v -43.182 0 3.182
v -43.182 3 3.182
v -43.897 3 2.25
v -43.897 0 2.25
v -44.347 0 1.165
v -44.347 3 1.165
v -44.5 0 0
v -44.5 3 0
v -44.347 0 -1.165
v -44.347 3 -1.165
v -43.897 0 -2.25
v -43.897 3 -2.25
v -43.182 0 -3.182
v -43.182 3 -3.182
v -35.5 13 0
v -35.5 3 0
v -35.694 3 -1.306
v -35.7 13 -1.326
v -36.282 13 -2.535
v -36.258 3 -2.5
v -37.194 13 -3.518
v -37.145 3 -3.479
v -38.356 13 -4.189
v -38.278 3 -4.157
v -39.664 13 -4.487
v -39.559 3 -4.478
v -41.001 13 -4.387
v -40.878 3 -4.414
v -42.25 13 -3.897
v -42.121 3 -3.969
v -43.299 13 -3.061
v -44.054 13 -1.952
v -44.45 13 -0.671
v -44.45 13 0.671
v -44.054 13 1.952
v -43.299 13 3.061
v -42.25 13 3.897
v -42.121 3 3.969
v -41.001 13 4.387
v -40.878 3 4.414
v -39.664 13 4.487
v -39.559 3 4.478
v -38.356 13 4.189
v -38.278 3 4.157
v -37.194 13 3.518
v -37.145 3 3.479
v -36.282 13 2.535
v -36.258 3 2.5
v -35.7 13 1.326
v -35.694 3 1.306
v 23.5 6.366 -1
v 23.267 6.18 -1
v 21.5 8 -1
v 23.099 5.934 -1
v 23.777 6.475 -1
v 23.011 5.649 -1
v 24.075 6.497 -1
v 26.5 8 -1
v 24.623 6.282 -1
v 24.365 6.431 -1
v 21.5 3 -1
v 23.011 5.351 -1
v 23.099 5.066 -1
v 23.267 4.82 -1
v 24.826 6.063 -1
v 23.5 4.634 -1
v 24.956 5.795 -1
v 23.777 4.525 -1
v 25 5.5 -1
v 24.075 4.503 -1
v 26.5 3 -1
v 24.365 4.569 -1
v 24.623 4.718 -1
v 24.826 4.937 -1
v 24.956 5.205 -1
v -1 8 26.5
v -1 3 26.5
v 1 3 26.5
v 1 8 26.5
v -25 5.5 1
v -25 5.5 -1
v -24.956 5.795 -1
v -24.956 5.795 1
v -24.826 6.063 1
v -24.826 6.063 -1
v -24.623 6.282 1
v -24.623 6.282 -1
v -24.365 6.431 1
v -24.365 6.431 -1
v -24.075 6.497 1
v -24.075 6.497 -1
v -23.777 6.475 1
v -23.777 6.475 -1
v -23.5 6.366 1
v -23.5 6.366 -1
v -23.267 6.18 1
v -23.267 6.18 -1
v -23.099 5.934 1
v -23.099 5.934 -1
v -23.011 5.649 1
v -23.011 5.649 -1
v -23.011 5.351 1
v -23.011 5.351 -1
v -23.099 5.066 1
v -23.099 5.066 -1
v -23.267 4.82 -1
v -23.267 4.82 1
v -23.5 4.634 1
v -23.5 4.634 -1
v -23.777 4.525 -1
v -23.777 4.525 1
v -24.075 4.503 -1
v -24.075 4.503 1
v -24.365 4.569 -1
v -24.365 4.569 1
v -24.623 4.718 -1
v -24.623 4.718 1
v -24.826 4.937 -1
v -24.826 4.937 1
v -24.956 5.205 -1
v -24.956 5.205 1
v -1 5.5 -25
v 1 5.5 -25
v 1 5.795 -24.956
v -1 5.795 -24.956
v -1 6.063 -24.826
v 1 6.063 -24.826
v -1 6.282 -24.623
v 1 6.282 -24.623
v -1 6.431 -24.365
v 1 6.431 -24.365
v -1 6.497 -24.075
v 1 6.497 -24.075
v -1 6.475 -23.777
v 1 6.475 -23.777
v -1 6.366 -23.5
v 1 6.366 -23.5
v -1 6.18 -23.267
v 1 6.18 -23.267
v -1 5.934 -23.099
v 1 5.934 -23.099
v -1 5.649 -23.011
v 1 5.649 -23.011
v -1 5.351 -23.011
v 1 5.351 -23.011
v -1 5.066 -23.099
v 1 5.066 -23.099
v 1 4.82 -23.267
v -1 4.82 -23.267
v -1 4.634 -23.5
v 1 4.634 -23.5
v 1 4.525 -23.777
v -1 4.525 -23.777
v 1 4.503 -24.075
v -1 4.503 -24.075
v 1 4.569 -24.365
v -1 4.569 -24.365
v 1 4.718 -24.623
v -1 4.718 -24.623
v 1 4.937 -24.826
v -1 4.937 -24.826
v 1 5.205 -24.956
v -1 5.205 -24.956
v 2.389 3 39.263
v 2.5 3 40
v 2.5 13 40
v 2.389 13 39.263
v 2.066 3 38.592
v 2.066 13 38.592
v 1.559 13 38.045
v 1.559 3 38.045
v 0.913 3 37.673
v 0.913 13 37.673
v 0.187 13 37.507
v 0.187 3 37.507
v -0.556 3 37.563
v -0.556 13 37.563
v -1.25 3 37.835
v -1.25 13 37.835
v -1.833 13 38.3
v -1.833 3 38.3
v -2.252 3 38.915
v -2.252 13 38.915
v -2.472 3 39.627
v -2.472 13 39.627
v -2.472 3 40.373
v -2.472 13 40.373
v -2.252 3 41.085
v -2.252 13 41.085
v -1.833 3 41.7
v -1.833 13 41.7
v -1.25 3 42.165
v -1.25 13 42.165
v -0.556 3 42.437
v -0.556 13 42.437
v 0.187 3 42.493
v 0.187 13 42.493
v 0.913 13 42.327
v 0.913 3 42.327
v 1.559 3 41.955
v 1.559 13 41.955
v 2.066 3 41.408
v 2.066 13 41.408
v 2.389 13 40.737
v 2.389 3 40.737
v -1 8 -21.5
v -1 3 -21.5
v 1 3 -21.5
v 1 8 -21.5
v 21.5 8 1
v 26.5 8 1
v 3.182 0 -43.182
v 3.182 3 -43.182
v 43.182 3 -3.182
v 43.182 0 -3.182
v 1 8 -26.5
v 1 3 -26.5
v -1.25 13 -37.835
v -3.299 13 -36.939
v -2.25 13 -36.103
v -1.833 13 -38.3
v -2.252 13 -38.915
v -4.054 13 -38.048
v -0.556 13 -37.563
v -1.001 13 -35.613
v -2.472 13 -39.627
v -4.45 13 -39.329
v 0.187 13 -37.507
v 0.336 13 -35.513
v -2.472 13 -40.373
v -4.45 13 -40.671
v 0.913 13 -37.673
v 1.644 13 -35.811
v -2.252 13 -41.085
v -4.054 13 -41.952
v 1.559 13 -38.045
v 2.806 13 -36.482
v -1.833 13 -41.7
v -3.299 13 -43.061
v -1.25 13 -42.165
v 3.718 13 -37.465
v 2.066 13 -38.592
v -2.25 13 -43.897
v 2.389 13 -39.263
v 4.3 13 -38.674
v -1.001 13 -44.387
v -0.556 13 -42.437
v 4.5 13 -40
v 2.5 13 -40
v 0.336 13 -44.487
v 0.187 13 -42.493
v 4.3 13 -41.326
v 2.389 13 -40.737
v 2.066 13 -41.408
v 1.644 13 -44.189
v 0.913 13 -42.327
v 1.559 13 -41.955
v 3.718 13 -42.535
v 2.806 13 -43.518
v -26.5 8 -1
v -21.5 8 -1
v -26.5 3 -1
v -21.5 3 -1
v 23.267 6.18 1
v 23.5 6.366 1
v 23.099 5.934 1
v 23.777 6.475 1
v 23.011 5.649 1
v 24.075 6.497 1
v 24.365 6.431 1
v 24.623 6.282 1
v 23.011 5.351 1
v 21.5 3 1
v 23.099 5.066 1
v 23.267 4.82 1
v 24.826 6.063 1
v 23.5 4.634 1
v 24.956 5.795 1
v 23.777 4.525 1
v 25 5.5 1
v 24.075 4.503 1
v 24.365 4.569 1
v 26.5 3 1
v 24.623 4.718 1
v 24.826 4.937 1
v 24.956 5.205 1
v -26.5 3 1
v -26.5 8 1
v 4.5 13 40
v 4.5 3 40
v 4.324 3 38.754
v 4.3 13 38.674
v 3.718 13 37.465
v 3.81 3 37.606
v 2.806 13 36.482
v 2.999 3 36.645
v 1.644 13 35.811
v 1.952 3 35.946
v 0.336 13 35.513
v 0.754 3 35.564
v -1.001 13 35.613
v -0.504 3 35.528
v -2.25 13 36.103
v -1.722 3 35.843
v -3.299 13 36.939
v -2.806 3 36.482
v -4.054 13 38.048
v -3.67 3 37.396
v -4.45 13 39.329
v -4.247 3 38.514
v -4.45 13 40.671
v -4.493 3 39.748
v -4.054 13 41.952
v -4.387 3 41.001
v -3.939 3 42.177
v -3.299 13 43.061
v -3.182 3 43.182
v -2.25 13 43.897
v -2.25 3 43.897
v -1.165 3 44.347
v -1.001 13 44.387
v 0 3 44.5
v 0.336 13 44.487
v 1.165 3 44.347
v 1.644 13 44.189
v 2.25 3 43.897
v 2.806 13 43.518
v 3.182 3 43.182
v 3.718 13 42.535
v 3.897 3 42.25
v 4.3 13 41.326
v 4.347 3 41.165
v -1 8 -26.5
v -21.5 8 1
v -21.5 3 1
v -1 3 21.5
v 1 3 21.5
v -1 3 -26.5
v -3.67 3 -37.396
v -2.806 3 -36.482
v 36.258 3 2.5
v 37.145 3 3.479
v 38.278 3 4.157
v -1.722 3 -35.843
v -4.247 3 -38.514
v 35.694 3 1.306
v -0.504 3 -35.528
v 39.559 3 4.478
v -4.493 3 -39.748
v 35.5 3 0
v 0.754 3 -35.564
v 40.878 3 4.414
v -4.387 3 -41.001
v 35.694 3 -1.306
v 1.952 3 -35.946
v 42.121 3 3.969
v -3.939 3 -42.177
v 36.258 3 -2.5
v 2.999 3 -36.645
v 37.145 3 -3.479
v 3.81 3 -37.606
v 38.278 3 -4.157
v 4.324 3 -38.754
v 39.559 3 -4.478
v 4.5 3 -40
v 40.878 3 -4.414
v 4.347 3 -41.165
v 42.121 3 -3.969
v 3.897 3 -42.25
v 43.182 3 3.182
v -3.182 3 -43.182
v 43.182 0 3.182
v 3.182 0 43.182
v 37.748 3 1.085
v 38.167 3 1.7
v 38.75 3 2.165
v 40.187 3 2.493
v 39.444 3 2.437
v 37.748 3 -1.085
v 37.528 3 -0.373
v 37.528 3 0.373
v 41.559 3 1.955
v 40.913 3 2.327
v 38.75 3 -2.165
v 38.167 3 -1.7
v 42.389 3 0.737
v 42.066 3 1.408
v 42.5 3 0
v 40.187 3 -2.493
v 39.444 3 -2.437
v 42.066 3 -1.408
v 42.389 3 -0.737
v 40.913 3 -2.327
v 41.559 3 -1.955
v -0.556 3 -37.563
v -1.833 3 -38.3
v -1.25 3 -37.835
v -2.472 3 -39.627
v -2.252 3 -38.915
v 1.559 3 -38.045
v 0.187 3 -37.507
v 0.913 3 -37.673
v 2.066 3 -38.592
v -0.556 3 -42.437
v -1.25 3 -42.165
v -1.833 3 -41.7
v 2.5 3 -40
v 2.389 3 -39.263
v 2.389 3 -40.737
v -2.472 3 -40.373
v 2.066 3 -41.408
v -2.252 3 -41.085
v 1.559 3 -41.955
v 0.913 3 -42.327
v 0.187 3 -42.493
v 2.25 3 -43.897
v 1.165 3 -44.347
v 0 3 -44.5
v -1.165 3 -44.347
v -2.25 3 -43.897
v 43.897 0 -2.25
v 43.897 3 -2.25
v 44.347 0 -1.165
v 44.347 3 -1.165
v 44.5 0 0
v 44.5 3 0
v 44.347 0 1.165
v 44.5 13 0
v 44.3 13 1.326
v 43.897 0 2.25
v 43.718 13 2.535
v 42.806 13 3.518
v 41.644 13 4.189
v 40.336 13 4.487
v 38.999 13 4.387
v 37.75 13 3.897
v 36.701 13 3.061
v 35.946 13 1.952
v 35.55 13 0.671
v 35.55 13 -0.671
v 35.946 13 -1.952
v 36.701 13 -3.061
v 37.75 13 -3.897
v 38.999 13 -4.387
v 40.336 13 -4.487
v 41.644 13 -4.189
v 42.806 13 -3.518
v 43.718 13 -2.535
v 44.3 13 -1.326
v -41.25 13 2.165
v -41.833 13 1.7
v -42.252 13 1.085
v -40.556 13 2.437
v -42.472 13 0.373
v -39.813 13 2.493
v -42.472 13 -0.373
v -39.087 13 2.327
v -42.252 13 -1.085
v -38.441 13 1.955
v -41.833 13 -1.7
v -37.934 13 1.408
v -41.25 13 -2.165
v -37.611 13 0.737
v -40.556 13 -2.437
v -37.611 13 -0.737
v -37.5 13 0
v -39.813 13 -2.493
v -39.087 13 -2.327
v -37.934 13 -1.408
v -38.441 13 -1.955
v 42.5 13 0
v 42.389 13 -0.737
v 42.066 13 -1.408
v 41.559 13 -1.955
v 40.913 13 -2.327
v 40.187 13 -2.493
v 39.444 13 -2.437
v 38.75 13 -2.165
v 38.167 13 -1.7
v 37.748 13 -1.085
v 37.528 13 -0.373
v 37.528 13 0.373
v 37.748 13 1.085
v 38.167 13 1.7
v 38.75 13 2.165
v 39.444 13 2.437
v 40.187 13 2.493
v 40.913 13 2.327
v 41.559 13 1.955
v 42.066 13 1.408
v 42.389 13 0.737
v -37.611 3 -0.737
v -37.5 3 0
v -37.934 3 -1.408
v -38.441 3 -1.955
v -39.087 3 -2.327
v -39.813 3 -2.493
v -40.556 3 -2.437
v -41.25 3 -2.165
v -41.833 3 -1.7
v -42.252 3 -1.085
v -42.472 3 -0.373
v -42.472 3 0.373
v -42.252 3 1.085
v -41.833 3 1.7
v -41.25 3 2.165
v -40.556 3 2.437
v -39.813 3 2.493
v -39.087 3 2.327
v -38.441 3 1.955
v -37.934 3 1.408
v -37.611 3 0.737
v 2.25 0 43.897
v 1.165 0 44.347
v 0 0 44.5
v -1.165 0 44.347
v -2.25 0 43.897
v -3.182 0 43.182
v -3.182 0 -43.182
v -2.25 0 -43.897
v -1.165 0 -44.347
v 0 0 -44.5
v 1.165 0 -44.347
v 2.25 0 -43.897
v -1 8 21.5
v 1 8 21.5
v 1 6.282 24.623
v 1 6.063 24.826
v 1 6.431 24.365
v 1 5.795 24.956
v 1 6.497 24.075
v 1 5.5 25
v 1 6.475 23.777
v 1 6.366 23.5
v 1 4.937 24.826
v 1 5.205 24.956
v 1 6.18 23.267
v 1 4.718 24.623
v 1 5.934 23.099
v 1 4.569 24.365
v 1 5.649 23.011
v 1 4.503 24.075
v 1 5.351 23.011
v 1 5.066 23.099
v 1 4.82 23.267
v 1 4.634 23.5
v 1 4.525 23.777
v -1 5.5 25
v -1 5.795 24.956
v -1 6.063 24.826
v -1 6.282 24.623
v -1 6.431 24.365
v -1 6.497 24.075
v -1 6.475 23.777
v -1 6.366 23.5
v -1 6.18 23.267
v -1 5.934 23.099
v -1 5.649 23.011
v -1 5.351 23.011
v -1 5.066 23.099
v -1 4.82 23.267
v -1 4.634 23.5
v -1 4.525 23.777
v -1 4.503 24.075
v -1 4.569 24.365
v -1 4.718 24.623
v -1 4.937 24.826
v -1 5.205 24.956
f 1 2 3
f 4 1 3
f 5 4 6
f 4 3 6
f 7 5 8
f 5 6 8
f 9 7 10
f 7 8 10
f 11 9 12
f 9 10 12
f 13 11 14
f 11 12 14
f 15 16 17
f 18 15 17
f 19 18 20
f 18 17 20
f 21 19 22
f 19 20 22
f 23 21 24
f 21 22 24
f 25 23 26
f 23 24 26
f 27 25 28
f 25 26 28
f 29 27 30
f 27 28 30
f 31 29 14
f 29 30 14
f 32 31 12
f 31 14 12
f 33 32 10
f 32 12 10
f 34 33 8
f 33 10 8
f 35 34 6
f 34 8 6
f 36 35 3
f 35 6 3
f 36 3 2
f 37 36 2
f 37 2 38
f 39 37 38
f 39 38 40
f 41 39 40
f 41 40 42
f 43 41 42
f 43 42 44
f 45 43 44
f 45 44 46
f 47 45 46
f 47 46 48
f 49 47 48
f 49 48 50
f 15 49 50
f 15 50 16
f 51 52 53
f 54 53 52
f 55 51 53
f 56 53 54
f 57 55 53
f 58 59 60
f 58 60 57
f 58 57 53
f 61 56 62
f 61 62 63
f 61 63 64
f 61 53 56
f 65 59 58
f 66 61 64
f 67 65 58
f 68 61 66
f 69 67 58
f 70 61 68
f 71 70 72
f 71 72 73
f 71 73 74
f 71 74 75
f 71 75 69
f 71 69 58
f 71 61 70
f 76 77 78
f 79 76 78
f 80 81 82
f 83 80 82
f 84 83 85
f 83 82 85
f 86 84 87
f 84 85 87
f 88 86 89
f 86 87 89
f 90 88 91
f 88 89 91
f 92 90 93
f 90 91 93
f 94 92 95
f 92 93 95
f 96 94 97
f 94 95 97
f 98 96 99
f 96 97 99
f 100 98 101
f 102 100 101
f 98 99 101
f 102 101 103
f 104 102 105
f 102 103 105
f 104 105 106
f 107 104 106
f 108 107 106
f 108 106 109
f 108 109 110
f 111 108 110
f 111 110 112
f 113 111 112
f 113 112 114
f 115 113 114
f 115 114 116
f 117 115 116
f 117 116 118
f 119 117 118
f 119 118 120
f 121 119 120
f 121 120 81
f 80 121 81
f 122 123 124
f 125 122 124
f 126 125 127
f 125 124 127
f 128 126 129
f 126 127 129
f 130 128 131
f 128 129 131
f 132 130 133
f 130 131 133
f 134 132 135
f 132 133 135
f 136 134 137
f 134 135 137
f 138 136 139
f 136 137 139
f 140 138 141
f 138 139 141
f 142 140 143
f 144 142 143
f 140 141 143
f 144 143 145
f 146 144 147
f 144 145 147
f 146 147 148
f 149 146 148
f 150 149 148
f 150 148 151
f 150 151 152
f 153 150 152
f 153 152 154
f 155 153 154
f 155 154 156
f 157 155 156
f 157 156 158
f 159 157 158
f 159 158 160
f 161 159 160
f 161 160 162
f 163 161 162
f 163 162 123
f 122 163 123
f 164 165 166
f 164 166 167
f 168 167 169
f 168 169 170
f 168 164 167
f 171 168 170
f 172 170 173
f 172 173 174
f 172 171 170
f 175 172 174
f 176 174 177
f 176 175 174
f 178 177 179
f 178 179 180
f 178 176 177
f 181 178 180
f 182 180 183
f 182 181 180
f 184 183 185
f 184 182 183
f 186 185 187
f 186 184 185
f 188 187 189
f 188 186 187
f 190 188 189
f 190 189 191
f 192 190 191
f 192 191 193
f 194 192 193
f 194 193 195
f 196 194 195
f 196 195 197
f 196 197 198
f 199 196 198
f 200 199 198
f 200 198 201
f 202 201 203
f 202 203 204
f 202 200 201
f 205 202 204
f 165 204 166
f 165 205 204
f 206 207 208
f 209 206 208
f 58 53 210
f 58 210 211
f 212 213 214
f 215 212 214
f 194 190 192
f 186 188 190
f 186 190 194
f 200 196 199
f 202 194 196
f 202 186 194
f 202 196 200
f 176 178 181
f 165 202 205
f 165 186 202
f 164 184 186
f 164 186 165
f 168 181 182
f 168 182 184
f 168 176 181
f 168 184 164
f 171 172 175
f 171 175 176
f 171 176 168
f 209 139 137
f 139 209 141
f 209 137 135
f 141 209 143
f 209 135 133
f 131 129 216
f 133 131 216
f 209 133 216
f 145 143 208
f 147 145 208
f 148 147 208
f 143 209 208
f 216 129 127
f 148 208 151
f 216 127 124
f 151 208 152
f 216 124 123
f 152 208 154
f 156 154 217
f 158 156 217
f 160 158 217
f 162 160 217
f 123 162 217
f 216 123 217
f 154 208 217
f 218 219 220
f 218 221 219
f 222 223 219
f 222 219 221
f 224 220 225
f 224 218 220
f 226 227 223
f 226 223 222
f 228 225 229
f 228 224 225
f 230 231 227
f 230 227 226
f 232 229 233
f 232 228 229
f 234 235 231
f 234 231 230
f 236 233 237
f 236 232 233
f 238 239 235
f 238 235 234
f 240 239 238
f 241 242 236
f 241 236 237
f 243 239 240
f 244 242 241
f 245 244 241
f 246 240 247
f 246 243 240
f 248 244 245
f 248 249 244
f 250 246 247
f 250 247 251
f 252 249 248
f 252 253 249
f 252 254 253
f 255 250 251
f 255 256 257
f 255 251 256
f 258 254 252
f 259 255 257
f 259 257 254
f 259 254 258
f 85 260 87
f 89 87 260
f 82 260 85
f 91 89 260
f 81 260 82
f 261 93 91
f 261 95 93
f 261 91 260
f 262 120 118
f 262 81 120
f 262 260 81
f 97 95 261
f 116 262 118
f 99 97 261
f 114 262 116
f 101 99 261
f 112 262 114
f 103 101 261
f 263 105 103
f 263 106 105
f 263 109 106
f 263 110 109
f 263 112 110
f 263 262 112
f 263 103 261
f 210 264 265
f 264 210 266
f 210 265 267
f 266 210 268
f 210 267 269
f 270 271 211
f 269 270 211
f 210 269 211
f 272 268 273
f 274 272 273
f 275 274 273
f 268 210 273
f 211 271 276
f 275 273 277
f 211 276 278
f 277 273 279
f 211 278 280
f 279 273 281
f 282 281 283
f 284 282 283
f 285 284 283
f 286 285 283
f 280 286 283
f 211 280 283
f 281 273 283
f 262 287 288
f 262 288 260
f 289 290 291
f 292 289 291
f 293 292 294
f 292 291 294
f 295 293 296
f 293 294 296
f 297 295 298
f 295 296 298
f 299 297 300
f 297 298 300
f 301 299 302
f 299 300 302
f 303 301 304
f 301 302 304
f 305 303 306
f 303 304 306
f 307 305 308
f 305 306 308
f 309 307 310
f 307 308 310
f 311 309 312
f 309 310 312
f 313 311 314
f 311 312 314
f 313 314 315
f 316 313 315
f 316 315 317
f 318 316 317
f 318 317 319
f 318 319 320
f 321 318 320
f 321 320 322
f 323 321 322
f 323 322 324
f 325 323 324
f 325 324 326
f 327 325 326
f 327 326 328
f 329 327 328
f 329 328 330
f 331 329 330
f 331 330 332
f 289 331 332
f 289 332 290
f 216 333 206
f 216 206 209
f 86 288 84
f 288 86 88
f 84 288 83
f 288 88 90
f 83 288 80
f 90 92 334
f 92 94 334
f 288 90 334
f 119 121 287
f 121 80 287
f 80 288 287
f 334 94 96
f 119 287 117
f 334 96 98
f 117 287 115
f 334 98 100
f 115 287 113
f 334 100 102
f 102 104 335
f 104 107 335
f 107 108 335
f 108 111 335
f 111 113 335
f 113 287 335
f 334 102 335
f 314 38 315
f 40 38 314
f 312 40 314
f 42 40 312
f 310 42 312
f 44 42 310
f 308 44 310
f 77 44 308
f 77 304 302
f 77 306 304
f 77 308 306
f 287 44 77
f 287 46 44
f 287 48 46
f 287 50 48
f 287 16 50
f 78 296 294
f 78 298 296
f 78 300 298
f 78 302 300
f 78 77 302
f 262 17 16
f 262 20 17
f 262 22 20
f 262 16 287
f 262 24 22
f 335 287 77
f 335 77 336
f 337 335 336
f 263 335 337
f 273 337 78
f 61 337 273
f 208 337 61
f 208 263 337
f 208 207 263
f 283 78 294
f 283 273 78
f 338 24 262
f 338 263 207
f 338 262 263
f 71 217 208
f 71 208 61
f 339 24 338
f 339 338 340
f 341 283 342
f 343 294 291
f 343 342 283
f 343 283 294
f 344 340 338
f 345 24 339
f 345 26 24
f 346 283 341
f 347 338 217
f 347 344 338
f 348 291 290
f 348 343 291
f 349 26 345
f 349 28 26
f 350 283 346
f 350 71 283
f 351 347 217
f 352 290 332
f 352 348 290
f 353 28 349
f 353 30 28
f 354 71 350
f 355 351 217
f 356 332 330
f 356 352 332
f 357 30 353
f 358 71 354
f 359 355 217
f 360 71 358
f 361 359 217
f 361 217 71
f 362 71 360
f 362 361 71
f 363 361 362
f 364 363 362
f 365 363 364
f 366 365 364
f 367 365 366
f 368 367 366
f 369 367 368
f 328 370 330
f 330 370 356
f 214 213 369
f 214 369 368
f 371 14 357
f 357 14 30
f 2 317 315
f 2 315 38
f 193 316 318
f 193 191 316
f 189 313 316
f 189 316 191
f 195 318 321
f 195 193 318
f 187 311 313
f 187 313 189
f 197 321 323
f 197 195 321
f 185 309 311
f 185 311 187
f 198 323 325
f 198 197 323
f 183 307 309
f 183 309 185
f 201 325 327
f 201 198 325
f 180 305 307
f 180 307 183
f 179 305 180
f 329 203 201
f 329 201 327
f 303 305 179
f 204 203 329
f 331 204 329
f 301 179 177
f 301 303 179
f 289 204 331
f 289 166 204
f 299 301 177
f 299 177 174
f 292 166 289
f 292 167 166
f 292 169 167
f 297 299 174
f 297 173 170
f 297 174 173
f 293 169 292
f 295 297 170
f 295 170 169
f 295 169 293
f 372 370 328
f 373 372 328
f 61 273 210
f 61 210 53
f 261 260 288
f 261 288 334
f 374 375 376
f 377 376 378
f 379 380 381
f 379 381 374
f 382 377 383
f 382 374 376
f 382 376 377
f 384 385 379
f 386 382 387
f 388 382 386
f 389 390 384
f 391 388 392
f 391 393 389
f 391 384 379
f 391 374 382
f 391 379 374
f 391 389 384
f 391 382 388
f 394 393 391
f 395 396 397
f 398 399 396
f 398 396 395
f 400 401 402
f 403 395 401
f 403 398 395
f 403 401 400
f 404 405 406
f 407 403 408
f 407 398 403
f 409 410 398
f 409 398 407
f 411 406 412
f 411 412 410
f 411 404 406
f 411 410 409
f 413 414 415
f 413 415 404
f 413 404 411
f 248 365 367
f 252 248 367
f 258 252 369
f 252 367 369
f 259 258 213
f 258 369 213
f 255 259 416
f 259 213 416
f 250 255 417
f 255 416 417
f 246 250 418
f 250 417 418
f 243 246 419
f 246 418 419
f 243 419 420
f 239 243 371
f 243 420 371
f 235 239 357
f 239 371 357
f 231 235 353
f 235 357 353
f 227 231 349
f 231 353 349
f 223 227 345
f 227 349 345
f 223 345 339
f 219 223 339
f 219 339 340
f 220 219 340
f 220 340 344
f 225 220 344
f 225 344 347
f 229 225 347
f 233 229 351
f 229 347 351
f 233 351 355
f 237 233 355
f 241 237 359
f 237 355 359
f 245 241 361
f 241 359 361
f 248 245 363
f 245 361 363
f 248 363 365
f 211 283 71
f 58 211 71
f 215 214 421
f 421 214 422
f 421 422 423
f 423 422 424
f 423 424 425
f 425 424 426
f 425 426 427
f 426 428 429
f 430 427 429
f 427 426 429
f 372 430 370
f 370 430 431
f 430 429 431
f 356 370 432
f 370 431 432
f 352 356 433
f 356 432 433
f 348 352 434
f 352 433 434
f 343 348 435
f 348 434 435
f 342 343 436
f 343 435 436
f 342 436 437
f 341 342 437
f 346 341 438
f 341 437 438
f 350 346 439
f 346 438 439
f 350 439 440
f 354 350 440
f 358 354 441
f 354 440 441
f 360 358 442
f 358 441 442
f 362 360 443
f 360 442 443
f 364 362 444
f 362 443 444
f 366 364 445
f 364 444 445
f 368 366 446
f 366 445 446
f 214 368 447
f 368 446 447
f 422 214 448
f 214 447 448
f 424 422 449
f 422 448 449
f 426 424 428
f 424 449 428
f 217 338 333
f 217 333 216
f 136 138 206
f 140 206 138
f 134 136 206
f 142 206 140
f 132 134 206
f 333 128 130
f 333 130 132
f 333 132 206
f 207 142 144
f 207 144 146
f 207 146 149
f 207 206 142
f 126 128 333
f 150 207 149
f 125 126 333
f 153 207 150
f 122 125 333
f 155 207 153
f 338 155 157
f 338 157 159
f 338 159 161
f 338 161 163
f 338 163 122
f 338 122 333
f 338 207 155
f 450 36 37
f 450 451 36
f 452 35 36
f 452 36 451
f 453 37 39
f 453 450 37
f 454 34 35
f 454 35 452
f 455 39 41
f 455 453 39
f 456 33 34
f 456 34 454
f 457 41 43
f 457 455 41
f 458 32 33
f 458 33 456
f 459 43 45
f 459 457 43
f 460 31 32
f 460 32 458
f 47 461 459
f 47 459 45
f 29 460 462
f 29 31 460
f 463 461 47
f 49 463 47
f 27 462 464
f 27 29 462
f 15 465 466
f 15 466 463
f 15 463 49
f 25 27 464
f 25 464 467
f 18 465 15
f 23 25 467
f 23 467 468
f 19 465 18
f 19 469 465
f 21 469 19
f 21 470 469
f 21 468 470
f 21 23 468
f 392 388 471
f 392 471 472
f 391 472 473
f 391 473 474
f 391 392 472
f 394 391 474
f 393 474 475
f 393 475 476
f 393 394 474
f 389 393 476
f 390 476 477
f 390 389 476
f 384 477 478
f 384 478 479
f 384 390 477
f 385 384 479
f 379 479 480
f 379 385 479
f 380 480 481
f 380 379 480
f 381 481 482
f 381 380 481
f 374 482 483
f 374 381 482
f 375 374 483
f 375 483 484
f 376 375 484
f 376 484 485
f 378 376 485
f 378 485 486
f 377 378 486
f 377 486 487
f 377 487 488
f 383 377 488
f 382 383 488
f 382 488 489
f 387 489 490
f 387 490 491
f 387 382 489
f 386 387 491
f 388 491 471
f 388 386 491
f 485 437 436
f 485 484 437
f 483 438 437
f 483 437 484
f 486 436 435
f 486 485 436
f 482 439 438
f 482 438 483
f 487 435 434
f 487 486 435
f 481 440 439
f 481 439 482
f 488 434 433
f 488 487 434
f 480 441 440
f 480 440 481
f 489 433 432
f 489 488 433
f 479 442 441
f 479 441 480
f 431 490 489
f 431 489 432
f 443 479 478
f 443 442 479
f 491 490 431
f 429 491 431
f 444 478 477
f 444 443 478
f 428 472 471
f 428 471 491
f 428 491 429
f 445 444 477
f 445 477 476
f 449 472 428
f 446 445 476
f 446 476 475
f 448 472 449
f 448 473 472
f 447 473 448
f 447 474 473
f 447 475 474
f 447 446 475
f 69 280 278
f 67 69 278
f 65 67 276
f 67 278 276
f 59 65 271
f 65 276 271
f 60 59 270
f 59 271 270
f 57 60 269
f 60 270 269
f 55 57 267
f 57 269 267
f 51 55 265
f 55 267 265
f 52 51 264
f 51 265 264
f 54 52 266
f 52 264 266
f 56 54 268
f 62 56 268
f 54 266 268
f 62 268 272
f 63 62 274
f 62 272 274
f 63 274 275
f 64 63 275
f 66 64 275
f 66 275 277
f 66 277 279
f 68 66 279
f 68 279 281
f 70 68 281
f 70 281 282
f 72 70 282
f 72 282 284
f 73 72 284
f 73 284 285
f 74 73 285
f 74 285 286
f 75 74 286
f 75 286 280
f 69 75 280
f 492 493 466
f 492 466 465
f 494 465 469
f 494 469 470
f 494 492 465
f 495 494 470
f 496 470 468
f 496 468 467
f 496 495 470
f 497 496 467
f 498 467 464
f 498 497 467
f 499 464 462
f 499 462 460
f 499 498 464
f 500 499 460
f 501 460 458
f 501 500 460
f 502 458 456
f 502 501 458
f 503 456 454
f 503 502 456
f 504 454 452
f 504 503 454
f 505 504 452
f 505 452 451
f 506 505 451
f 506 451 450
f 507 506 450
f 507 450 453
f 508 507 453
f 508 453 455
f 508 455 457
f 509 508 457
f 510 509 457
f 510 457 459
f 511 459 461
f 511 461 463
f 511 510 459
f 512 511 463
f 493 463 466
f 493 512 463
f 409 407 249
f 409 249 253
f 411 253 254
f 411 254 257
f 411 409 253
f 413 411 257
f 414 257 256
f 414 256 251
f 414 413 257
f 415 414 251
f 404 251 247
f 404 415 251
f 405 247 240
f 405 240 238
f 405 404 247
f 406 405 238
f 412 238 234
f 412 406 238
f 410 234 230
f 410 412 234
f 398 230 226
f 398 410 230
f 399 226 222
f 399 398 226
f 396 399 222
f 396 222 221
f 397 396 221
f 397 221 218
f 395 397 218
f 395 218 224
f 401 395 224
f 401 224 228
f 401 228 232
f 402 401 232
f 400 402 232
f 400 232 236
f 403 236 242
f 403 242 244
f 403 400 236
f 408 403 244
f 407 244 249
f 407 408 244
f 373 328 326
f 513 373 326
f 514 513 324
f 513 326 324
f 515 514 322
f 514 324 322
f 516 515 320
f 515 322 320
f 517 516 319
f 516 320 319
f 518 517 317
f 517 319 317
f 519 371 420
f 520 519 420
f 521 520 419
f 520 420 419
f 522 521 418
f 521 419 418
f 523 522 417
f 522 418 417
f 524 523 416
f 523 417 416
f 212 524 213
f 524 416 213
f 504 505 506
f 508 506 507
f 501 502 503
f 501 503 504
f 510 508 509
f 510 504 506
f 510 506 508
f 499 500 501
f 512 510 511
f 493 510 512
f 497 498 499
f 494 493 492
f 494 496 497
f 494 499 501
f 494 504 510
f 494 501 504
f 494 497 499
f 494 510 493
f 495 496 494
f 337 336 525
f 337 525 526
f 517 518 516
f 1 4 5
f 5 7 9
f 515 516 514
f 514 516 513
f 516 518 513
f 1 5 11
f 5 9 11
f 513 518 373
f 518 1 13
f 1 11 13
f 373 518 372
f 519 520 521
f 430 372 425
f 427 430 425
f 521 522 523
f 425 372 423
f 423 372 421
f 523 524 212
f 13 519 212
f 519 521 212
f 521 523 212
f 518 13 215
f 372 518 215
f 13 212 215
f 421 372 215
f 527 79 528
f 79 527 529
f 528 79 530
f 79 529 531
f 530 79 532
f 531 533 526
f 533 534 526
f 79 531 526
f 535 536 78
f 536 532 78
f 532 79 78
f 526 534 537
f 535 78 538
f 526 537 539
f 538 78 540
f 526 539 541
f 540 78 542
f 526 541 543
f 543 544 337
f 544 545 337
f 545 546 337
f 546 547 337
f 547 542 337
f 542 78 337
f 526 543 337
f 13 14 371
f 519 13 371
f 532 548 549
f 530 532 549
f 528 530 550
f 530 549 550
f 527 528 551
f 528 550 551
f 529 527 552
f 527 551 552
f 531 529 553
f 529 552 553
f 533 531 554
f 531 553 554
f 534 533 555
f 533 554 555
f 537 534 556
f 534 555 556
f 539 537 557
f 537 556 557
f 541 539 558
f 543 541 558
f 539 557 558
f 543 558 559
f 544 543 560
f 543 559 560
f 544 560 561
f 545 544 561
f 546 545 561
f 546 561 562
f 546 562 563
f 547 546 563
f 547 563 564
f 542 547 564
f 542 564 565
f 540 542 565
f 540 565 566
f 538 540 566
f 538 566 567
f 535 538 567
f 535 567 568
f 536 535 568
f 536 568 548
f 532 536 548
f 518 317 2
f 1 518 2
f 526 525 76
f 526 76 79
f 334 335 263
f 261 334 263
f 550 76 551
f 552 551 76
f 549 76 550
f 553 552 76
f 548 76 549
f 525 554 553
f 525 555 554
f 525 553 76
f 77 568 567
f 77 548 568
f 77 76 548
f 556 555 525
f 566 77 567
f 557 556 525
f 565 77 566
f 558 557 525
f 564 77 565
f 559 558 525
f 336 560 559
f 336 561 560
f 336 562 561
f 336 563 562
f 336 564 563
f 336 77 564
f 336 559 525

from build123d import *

# Parameters (mm, degrees)
SKETCH1_W           = 100
SKETCH1_H           = 100
BOSS_EXTRUDE1_DEPTH = 3
SKETCH2_R           = 4.5
SKETCH2_R_2         = 2.5
BOSS_EXTRUDE2_DEPTH = 10
SKETCH3_W           = 4.999999906
SKETCH3_H           = 2
SKETCH3_W_2         = 2
SKETCH3_H_2         = 4.999999906
BOSS_EXTRUDE3_DEPTH = 5
CUT_EXTRUDE1_REACH  = 74.595
SKETCH4_R           = 1
CUT_EXTRUDE2_REACH  = 74.595
SKETCH5_R           = 1
CUT_EXTRUDE3_REACH  = 74.595
SKETCH7_R           = 1
CUT_EXTRUDE4_REACH  = 74.595
SKETCH8_R           = 1
SKETCH9_OUTSIDE_W   = 130.404
SKETCH9_OUTSIDE_H   = 130.404
CUT_EXTRUDE5_DEPTH  = 127


with BuildPart() as part:
    # Sketch1 → Boss-Extrude1 (new body)
    with BuildSketch(Plane(origin=(0, 0, 0), x_dir=(1, 0, 0), z_dir=(0, 1, 0))):
        Rectangle(SKETCH1_W, SKETCH1_H)
    extrude(amount=BOSS_EXTRUDE1_DEPTH)

    # Sketch2 → Boss-Extrude2 (add)
    # profile 1 of 4: a face of its own
    with BuildSketch(Plane(origin=(0, 3, 0), x_dir=(1, 0, 0), z_dir=(0, 1, 0))):
        with Locations((0, 40)):
            Circle(SKETCH2_R)
        with Locations((0, 40)):
            Circle(SKETCH2_R_2, mode=Mode.SUBTRACT)
    # profile 2 of 4: a face of its own
    with BuildSketch(Plane(origin=(0, 3, 0), x_dir=(1, 0, 0), z_dir=(0, 1, 0))):
        with Locations((40, 0)):
            Circle(SKETCH2_R)
        with Locations((40, 0)):
            Circle(SKETCH2_R_2, mode=Mode.SUBTRACT)
    # profile 3 of 4: a face of its own
    with BuildSketch(Plane(origin=(0, 3, 0), x_dir=(1, 0, 0), z_dir=(0, 1, 0))):
        with Locations((0, -40)):
            Circle(SKETCH2_R)
        with Locations((0, -40)):
            Circle(SKETCH2_R_2, mode=Mode.SUBTRACT)
    # profile 4 of 4: a face of its own
    with BuildSketch(Plane(origin=(0, 3, 0), x_dir=(1, 0, 0), z_dir=(0, 1, 0))):
        with Locations((-40, 0)):
            Circle(SKETCH2_R)
        with Locations((-40, 0)):
            Circle(SKETCH2_R_2, mode=Mode.SUBTRACT)
    extrude(amount=BOSS_EXTRUDE2_DEPTH)

    # Sketch3 → Boss-Extrude3 (add)
    with BuildSketch(Plane(origin=(0, 3, 0), x_dir=(1, 0, 0), z_dir=(0, 1, 0))):
        with Locations((24.000000006, 0)):
            Rectangle(SKETCH3_W, SKETCH3_H)
        with Locations((0, 24.000000006)):
            Rectangle(SKETCH3_W_2, SKETCH3_H_2)
        with Locations((0, -24.000000006)):
            Rectangle(SKETCH3_W_2, SKETCH3_H_2)
        with Locations((-24.000000006, 0)):
            Rectangle(SKETCH3_W, SKETCH3_H)
    extrude(amount=BOSS_EXTRUDE3_DEPTH)

    # Sketch4 → Cut-Extrude1 (cut, up to next)
    with BuildSketch(Plane(origin=(1, 0, 0), x_dir=(0, 0, -1), z_dir=(1, 0, 0)), mode=Mode.PRIVATE) as cut_extrude1_sk1:
        with Locations((24.000000006, 5.5)):
            Circle(SKETCH4_R)
    cut_extrude1_tool1 = extrude(cut_extrude1_sk1.sketch, amount=-CUT_EXTRUDE1_REACH, mode=Mode.PRIVATE) & part.part
    add(cut_extrude1_tool1.solids().sort_by_distance((1, 5.5, -24))[0], mode=Mode.SUBTRACT)

    # Sketch5 → Cut-Extrude2 (cut, up to next)
    with BuildSketch(Plane(origin=(0, 0, -1), x_dir=(-1, 0, 0), z_dir=(0, 0, -1)), mode=Mode.PRIVATE) as cut_extrude2_sk1:
        with Locations((24.000000006, 5.5)):
            Circle(SKETCH5_R)
    cut_extrude2_tool1 = extrude(cut_extrude2_sk1.sketch, amount=-CUT_EXTRUDE2_REACH, mode=Mode.PRIVATE) & part.part
    add(cut_extrude2_tool1.solids().sort_by_distance((-24, 5.5, -1))[0], mode=Mode.SUBTRACT)

    # Sketch7 → Cut-Extrude3 (cut, up to next)
    with BuildSketch(Plane.ZY.offset(1), mode=Mode.PRIVATE) as cut_extrude3_sk1:
        with Locations((24.000000006, 5.5)):
            Circle(SKETCH7_R)
    cut_extrude3_tool1 = extrude(cut_extrude3_sk1.sketch, amount=-CUT_EXTRUDE3_REACH, mode=Mode.PRIVATE) & part.part
    add(cut_extrude3_tool1.solids().sort_by_distance((-1, 5.5, 24))[0], mode=Mode.SUBTRACT)

    # Sketch8 → Cut-Extrude4 (cut, up to next)
    with BuildSketch(Plane.XY.offset(1), mode=Mode.PRIVATE) as cut_extrude4_sk1:
        with Locations((24.000000006, 5.5)):
            Circle(SKETCH8_R)
    cut_extrude4_tool1 = extrude(cut_extrude4_sk1.sketch, amount=-CUT_EXTRUDE4_REACH, mode=Mode.PRIVATE) & part.part
    add(cut_extrude4_tool1.solids().sort_by_distance((24, 5.5, 1))[0], mode=Mode.SUBTRACT)

    # Sketch9 outside → Cut-Extrude5 (cut)
    with BuildSketch(Plane(origin=(0, 3, 0), x_dir=(1, 0, 0), z_dir=(0, 1, 0))):
        Rectangle(SKETCH9_OUTSIDE_W, SKETCH9_OUTSIDE_H)
        with BuildLine():
            Line((3.181980515, 43.181980515), (43.181980515, 3.181980515))
            ThreePointArc((43.181980515, 3.181980515), (44.5, 0), (43.181980515, -3.181980515))
            Line((43.181980515, -3.181980515), (3.181980515, -43.181980515))
            ThreePointArc((3.181980515, -43.181980515), (0, -44.5), (-3.181980515, -43.181980515))
            Line((-3.181980515, -43.181980515), (-43.181980515, -3.181980515))
            ThreePointArc((-43.181980515, -3.181980515), (-44.5, 0), (-43.181980515, 3.181980515))
            Line((-43.181980515, 3.181980515), (-3.181980515, 43.181980515))
            ThreePointArc((-3.181980515, 43.181980515), (0, 44.5), (3.181980515, 43.181980515))
        make_face(mode=Mode.SUBTRACT)
    extrude(amount=-CUT_EXTRUDE5_DEPTH, mode=Mode.SUBTRACT)


solid = part.part
